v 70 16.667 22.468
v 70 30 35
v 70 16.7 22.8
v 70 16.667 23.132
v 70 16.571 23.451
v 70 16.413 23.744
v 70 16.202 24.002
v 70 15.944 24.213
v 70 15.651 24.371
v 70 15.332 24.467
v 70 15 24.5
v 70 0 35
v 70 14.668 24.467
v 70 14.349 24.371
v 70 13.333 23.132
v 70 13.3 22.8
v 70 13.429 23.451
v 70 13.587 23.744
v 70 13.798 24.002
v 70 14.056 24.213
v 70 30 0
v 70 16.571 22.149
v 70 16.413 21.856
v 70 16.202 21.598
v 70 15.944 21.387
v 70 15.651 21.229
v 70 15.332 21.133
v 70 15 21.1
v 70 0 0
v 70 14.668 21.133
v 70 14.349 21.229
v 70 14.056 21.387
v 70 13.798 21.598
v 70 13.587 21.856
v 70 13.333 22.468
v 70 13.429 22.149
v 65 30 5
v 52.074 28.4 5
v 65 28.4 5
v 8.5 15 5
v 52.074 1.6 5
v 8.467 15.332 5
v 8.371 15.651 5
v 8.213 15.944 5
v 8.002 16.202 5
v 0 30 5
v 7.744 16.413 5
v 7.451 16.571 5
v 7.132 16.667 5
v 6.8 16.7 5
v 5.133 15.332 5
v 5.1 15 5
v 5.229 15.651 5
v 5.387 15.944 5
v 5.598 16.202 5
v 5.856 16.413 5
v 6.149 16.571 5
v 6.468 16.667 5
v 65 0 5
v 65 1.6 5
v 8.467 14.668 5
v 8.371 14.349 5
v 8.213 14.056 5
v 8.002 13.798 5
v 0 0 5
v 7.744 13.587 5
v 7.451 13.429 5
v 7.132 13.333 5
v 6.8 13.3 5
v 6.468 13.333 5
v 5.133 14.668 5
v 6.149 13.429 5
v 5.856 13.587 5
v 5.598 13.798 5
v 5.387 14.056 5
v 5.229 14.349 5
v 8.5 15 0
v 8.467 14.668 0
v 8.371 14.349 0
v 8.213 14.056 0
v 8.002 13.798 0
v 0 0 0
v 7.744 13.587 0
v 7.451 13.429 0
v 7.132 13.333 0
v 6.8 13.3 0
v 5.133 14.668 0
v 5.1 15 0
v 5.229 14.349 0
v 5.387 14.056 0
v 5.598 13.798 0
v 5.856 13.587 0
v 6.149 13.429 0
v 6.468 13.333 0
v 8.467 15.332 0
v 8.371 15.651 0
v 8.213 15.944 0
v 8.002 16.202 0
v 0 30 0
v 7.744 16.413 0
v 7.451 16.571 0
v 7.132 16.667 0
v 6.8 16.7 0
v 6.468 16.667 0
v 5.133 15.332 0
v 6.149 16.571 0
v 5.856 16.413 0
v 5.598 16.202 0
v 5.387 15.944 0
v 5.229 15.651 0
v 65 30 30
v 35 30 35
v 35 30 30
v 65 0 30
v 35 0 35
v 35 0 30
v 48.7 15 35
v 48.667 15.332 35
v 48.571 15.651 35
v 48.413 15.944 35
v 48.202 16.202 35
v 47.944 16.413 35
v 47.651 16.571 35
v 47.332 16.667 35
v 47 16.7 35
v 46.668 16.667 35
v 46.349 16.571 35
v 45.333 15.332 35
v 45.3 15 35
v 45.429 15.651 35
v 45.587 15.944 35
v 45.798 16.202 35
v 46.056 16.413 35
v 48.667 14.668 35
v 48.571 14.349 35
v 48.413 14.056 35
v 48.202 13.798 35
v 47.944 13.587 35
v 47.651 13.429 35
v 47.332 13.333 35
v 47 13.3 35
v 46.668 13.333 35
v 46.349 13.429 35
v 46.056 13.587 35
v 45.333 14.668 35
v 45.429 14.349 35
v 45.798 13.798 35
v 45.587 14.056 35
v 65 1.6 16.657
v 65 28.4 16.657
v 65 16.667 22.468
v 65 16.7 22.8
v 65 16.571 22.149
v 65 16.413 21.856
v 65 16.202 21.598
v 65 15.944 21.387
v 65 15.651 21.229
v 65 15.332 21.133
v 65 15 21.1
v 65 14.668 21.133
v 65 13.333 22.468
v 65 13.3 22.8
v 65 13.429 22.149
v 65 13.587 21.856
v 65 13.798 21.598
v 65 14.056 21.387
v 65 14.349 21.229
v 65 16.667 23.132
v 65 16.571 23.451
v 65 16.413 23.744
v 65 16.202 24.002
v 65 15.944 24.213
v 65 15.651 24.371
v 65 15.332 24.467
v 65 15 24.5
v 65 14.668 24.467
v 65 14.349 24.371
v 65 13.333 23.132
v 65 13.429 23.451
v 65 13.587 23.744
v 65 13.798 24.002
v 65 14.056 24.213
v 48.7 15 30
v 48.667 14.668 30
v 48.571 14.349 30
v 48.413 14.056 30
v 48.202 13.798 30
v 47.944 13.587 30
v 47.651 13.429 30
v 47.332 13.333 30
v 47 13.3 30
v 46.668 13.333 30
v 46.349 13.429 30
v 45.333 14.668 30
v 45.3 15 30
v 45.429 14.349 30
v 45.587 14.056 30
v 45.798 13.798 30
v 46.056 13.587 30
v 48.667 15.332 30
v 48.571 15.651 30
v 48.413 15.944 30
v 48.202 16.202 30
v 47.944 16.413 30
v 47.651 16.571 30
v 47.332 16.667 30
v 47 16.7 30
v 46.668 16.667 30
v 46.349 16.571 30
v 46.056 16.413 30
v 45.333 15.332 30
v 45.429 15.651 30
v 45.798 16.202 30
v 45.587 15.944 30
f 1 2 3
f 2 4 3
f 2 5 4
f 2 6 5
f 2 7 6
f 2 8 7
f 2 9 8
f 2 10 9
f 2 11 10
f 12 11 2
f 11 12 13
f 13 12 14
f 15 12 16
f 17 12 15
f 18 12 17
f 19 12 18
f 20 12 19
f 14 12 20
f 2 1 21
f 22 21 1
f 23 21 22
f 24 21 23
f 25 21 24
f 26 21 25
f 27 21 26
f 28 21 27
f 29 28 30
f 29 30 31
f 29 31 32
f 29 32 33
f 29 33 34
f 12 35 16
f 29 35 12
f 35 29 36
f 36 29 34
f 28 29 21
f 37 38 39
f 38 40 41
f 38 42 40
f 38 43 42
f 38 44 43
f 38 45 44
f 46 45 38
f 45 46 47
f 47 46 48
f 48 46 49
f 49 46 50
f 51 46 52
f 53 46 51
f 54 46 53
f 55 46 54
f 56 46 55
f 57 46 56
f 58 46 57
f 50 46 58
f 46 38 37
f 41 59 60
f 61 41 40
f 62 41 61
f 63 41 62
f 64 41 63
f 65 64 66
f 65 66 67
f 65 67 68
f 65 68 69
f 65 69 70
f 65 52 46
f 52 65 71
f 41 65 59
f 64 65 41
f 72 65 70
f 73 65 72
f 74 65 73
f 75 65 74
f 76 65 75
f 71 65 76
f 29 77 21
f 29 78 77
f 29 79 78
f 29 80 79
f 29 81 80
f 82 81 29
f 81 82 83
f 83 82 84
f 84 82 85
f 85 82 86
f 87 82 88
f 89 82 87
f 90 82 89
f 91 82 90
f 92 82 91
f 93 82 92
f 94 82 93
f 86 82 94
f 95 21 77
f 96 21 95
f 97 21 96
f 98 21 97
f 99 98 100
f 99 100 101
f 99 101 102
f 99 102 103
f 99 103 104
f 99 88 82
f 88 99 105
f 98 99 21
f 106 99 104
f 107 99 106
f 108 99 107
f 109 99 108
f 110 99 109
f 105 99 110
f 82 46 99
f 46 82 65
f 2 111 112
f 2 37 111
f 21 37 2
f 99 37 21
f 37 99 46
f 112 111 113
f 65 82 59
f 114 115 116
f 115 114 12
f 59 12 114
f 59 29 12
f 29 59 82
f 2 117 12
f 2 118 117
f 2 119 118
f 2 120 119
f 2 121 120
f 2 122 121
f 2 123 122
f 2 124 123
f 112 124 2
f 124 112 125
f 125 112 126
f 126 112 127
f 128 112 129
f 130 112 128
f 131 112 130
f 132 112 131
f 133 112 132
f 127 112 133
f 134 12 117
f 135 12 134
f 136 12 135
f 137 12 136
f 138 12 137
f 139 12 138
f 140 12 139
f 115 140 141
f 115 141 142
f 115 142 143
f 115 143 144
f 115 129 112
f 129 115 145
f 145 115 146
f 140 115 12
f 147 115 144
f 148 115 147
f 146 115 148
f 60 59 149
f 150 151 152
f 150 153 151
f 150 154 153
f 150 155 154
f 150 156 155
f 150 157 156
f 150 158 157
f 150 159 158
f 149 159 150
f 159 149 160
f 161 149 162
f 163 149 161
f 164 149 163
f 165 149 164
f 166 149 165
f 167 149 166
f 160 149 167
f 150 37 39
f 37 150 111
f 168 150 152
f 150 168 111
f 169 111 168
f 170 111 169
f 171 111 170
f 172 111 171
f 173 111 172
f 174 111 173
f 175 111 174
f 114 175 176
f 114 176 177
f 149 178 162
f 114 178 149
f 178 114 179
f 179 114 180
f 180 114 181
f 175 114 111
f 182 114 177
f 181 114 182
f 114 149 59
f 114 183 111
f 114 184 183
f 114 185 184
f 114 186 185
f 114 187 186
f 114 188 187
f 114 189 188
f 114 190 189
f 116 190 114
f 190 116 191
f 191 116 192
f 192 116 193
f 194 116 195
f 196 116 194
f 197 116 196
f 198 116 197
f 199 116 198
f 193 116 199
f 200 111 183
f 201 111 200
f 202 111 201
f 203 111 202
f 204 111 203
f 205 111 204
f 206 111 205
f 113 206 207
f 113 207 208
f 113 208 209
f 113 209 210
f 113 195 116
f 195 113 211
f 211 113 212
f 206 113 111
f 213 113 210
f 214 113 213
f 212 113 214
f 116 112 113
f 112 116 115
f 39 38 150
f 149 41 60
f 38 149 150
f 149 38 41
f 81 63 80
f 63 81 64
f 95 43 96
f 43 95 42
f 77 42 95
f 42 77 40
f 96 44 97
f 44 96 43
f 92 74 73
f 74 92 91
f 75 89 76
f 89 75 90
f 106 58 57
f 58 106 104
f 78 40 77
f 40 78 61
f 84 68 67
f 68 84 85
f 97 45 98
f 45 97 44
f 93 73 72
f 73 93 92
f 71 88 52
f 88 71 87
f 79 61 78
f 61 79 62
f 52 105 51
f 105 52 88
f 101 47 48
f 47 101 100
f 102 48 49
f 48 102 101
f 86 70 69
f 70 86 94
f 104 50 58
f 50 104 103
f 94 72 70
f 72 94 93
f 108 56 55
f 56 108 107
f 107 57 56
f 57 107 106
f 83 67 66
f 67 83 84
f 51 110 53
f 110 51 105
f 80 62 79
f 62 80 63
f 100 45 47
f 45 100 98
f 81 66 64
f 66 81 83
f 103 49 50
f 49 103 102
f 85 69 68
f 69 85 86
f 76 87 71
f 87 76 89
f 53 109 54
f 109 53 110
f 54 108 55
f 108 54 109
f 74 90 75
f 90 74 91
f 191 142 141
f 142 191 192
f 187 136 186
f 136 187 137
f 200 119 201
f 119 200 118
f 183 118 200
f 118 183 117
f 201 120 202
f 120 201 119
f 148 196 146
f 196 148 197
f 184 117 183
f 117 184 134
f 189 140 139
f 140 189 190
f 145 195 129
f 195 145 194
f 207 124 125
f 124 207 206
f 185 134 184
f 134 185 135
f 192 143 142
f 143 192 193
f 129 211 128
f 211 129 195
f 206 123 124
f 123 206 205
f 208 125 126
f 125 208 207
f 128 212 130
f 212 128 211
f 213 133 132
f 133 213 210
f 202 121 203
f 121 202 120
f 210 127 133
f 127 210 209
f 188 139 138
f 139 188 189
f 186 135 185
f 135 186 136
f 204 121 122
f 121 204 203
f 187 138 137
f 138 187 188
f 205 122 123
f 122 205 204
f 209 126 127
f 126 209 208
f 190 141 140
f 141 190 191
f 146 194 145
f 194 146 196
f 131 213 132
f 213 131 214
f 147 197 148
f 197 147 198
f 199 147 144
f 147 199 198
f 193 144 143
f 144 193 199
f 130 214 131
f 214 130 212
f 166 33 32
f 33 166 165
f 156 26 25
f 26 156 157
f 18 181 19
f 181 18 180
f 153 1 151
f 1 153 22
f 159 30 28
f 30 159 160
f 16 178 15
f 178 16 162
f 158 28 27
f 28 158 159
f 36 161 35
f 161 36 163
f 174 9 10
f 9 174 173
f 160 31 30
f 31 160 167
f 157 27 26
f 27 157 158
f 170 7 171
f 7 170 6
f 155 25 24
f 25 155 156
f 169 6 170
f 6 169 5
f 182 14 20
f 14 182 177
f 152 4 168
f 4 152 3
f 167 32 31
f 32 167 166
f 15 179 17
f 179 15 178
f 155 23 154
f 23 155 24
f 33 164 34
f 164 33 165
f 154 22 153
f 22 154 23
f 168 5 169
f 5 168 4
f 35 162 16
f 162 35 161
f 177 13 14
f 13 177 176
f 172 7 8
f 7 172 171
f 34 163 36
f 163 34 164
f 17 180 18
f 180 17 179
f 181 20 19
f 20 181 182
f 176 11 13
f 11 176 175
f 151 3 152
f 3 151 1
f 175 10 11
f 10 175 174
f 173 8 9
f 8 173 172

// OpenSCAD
$fn = 32;

// ----------------------------------------------------------------------
// Z-bracket: 70 x 30 x 35 mm
// ----------------------------------------------------------------------

// --- parameters (mm) ---
bottom_run = 70;          // lower foot length, X
top_run = 30;             // upper foot length, X
profile_w = 30;           // bracket width, Y
height = 35;              // overall rise, Z
mat_t = 5;                // plate thickness
hole_d = 3.4;             // clearance for M3
rib_len = 14.7;           // gusset leg
rib_sink = 1.6;           // gusset overlap into the plates

module hole_z(px, py, z0) {
  translate([px, py, z0 - 2.5]) cylinder(h = mat_t + 5, d = hole_d);
}
module hole_x(py, pz) {
  translate([-2.5, py, pz]) rotate([0, 90, 0]) cylinder(h = mat_t + 5, d = hole_d);
}
module gusset(x0) {
  translate([x0, profile_w - rib_sink, 0])
    rotate([90, 0, 0])
      linear_extrude(height = profile_w - 2 * rib_sink)
        polygon(points = [[rib_sink, mat_t - rib_sink],
                          [rib_sink, mat_t - rib_sink + rib_len],
                          [-rib_len, mat_t - rib_sink]]);
}

difference() {
  union() {
    cube([bottom_run, profile_w, mat_t]);
    /* web, overlapping the lower foot */
    translate([bottom_run - mat_t, 0, 0]) cube([mat_t, profile_w, height]);
    /* upper foot, sunk into the web */
    translate([bottom_run - mat_t - top_run, 0, height - mat_t]) cube([top_run + mat_t, profile_w, mat_t]);
    gusset(bottom_run - mat_t);
  }
  hole_z(6.8, 15, 0);
  translate([bottom_run - mat_t - 18, 0, 0]) hole_z(0, 15, height - mat_t);
  translate([bottom_run - mat_t, 0, 0]) hole_x(15, 22.8);
}
